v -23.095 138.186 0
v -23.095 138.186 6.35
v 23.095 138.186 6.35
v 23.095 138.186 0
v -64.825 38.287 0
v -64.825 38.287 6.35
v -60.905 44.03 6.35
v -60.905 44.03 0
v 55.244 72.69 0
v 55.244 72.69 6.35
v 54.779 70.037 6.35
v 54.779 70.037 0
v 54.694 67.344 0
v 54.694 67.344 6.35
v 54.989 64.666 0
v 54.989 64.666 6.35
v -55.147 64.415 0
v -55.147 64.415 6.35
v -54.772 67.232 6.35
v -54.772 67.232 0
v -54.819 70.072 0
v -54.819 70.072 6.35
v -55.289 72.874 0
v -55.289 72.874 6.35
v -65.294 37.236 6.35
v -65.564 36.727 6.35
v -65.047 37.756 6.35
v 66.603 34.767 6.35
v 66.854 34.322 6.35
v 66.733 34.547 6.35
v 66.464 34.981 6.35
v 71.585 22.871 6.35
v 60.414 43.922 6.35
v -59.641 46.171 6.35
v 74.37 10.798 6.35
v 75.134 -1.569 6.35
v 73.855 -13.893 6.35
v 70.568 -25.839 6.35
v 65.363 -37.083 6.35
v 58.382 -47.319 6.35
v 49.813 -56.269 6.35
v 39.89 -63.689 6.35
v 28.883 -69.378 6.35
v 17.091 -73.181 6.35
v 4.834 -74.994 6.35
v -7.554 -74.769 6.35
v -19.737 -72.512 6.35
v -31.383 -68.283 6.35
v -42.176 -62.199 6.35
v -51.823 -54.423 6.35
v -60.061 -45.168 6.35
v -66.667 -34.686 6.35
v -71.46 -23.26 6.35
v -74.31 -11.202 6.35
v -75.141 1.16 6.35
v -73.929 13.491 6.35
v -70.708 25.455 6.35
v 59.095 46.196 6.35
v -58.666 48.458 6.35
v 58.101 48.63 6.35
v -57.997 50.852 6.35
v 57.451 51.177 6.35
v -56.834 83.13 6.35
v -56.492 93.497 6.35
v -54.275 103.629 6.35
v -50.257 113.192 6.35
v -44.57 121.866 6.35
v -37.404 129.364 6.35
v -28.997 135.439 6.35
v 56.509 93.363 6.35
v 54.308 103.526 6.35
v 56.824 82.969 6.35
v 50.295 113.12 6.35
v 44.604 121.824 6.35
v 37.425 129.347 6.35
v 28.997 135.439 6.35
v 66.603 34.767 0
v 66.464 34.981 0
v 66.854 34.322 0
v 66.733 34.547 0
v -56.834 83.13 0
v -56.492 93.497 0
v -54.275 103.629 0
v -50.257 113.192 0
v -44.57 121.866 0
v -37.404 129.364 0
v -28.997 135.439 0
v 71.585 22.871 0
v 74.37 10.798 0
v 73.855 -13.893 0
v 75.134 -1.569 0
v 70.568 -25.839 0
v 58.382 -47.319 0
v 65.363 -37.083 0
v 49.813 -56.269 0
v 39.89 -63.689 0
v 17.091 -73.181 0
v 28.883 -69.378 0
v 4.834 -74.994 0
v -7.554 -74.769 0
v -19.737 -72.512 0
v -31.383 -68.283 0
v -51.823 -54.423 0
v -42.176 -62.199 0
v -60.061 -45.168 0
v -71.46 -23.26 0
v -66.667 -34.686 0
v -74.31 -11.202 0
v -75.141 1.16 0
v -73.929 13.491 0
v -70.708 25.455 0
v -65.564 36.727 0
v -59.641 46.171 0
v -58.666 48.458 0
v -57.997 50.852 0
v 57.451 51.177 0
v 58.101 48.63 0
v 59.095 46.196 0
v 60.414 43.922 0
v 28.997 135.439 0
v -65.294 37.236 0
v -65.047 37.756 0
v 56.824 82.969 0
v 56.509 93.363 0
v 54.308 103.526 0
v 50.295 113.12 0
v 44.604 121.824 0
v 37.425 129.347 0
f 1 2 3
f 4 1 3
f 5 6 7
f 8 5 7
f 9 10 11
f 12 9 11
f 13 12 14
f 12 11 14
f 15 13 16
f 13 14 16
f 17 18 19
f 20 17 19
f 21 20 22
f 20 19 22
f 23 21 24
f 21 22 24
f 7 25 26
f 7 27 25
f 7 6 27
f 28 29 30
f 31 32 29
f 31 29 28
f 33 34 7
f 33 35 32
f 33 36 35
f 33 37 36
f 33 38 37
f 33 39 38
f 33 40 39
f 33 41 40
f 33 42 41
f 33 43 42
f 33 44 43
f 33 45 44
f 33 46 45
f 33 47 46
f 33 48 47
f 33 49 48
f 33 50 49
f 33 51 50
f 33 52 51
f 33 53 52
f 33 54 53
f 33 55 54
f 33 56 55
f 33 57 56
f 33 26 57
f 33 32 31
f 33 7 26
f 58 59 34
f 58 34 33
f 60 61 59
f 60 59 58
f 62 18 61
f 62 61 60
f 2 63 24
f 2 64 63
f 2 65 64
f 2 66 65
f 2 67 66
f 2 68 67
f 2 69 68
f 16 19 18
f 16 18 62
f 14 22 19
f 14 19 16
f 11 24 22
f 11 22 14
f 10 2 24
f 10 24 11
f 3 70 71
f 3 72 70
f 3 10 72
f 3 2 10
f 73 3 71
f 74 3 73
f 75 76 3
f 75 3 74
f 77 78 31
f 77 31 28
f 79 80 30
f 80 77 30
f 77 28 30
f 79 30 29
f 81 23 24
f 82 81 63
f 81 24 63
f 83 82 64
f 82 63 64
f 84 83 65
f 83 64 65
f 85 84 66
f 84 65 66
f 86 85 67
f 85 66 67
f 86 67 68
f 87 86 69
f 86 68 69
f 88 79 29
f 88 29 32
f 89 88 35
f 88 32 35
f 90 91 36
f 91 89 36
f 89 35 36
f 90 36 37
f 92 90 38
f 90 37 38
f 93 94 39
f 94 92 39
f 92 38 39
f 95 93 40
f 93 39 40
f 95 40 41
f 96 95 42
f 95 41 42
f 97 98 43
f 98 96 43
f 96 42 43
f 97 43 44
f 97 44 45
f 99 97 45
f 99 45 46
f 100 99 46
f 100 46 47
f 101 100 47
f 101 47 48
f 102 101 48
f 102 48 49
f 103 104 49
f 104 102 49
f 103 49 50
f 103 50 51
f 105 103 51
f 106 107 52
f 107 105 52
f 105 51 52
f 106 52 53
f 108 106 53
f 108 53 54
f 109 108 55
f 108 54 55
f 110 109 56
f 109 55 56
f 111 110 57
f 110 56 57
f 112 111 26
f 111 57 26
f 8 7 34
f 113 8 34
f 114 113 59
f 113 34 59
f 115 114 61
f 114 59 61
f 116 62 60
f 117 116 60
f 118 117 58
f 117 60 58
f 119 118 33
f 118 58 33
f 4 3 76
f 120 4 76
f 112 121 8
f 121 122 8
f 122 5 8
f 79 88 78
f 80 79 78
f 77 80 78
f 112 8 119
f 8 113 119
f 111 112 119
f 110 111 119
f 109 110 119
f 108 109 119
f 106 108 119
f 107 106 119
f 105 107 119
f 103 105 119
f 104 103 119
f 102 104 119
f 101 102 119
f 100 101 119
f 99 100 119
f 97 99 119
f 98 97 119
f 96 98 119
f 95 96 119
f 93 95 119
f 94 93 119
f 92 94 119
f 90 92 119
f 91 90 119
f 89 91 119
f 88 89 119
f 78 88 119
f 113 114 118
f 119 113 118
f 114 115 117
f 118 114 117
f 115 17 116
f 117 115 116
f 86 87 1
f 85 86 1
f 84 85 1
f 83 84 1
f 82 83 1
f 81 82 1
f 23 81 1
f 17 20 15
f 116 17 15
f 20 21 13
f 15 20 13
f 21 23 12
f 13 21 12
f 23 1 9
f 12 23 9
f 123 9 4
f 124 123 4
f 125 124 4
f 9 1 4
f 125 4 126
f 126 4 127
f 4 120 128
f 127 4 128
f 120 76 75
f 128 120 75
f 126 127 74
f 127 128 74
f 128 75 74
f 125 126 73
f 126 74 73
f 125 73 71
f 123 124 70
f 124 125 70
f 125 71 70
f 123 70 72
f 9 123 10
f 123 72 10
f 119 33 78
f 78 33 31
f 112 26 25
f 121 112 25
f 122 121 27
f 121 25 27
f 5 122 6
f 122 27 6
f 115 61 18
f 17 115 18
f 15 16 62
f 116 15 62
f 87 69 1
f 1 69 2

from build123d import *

# Parameters (mm, degrees)
F1_DEPTH = 6.35
F2_R     = 12.7
F4_DEPTH = 6.351


# Not quite as in the source:
# - a feature names something its author has since deleted; it is built from what else it names


with BuildPart() as f1:
    # F0 (on Top) → F1 (new body)
    with BuildSketch(Plane.XY):
        with BuildLine():
            ThreePointArc((-70.543128599, 41.1726645916), (-70.7849997477, 40.4855010306), (-71.1039826136, 39.8305618399))
            ThreePointArc((-71.1039826136, 39.8305618399), (-1.0804242799, -81.4928382336), (72.1349447987, 37.9315137965))
            Line((72.1349447987, 37.9315137965), (64.1774671745, 49.691417374))
            Line((64.1774671745, 49.691417374), (60.7204563849, 68.6290463558))
            ThreePointArc((60.7204563849, 68.6290463558), (58.8124253174, 109.8022050591), (31.9532798351, 141.0664959374))
            Line((31.9532798352, 141.0664959374), (24.5, 144.5356458426))
            Line((24.5, 144.5356458426), (0, 144.5356458426))
            Line((0, 144.5356458426), (-24.5, 144.5356458426))
            Line((-24.5, 144.5356458426), (-31.9532798352, 141.0664959374))
            ThreePointArc((-31.9532798351, 141.0664959374), (-58.8010464391, 109.8308374249), (-60.7377773112, 68.688183064))
            Line((-60.7377773112, 68.688183064), (-64.7292534015, 49.691417374))
            Line((-64.7292534015, 49.691417374), (-70.543128599, 41.1726645916))
        make_face()
    extrude(amount=F1_DEPTH)

    # F2
    f2_edges = [f1.edges().sort_by_distance(p)[0] for p in [
        (60.720456, 68.629046, 3.175),
        (72.134945, 37.931514, 3.175),
        (64.177467, 49.691417, 3.175),
        (-64.729253, 49.691417, 3.175),
        (-60.737777, 68.688183, 3.175),
    ]]
    fillet(f2_edges, radius=F2_R)

    # F3 (on face) → F4 (cut, through all)
    with BuildSketch(Plane.XY.offset(6.35)):
        with BuildLine():
            ThreePointArc((-70.543128599, 41.1726645916), (-70.7849997477, 40.4855010306), (-71.1039826136, 39.8305618399))
            ThreePointArc((-71.1039826136, 39.8305618399), (-1.4798729053, -81.4865631634), (72.5033392644, 37.2225173183))
            ThreePointArc((72.5033392644, 37.2225173183), (72.133296657, 37.8927702646), (71.7235387193, 38.5395074414))
            Line((71.7235387193, 38.5395074414), (65.673391241, 47.4806762809))
            ThreePointArc((65.673391241, 47.4806762809), (64.4343566454, 49.7963304465), (63.6981152819, 52.3173242185))
            Line((63.6981152819, 52.3173242185), (61.235654247, 65.8067740057))
            ThreePointArc((61.235654247, 65.8067740057), (61.0355921512, 68.4904493527), (61.4054899639, 71.1560288055))
            ThreePointArc((61.4054899639, 71.1560288055), (58.3166642414, 111.0138701005), (31.9532798351, 141.0664959374))
            Line((31.9532798352, 141.0664959374), (24.5, 144.5356458426))
            Line((24.5, 144.5356458426), (-24.5, 144.5356458426))
            Line((-24.5, 144.5356458426), (-31.9532798352, 141.0664959374))
            ThreePointArc((-31.9532798351, 141.0664959374), (-58.2757571875, 111.1107457801), (-61.4559677961, 71.3601980865))
            ThreePointArc((-61.4559677961, 71.3601980865), (-61.0915979292, 68.5460068659), (-61.3611887293, 65.7211602459))
            Line((-61.3611887293, 65.7211602459), (-64.2110715476, 52.1576176071))
            ThreePointArc((-64.2110715476, 52.1576176071), (-64.9570302406, 49.7885224974), (-66.149830538, 47.6099235298))
            Line((-66.149830538, 47.6099235298), (-70.543128599, 41.1726645916))
        make_face()
        with BuildLine():
            Line((-28.9966635349, 135.438502816), (-23.0945782645, 138.1856448808))
            Line((-23.0945782645, 138.1856448808), (23.0945782645, 138.1856448808))
            Line((23.0945782645, 138.1856448808), (28.9966635349, 135.438502816))
            ThreePointArc((28.9966635349, 135.438502816), (52.520857183, 108.4149325541), (55.243636, 72.6903260202))
            ThreePointArc((55.243636, 72.6903260202), (54.6887892531, 68.6919566393), (54.988882412, 64.6664434155))
            Line((54.988882412, 64.6664434155), (57.4513434469, 51.1769936283))
            ThreePointArc((57.4513434469, 51.1769936283), (58.5557055478, 47.3955027794), (60.4142575351, 43.9220213556))
            Line((60.4142575351, 43.9220213556), (66.4644050134, 34.9808525161))
            ThreePointArc((66.4644050134, 34.9808525161), (66.6692839512, 34.6574839767), (66.8543052269, 34.3223575543))
            ThreePointArc((66.8543052269, 34.3223575543), (-1.3645699068, -75.137609121), (-65.5639782212, 36.7271985762))
            ThreePointArc((-65.5639782212, 36.7271985762), (-65.1678300151, 37.4944518277), (-64.8247337429, 38.2868506548))
            Line((-64.8247337429, 38.2868506548), (-60.904901379, 44.0303662485))
            ThreePointArc((-60.904901379, 44.0303662485), (-59.1157008425, 47.2982648647), (-57.9967627465, 50.8519077088))
            Line((-57.9967627465, 50.8519077088), (-55.1468799282, 64.4154503476))
            ThreePointArc((-55.1468799282, 64.4154503476), (-54.7424937077, 68.6527204915), (-55.2890485355, 72.8740075355))
            ThreePointArc((-55.2890485355, 72.8740075355), (-52.4842770002, 108.5021804525), (-28.9966635349, 135.438502816))
        make_face(mode=Mode.SUBTRACT)
    extrude(amount=-F4_DEPTH, mode=Mode.SUBTRACT)


solid = f1.part
